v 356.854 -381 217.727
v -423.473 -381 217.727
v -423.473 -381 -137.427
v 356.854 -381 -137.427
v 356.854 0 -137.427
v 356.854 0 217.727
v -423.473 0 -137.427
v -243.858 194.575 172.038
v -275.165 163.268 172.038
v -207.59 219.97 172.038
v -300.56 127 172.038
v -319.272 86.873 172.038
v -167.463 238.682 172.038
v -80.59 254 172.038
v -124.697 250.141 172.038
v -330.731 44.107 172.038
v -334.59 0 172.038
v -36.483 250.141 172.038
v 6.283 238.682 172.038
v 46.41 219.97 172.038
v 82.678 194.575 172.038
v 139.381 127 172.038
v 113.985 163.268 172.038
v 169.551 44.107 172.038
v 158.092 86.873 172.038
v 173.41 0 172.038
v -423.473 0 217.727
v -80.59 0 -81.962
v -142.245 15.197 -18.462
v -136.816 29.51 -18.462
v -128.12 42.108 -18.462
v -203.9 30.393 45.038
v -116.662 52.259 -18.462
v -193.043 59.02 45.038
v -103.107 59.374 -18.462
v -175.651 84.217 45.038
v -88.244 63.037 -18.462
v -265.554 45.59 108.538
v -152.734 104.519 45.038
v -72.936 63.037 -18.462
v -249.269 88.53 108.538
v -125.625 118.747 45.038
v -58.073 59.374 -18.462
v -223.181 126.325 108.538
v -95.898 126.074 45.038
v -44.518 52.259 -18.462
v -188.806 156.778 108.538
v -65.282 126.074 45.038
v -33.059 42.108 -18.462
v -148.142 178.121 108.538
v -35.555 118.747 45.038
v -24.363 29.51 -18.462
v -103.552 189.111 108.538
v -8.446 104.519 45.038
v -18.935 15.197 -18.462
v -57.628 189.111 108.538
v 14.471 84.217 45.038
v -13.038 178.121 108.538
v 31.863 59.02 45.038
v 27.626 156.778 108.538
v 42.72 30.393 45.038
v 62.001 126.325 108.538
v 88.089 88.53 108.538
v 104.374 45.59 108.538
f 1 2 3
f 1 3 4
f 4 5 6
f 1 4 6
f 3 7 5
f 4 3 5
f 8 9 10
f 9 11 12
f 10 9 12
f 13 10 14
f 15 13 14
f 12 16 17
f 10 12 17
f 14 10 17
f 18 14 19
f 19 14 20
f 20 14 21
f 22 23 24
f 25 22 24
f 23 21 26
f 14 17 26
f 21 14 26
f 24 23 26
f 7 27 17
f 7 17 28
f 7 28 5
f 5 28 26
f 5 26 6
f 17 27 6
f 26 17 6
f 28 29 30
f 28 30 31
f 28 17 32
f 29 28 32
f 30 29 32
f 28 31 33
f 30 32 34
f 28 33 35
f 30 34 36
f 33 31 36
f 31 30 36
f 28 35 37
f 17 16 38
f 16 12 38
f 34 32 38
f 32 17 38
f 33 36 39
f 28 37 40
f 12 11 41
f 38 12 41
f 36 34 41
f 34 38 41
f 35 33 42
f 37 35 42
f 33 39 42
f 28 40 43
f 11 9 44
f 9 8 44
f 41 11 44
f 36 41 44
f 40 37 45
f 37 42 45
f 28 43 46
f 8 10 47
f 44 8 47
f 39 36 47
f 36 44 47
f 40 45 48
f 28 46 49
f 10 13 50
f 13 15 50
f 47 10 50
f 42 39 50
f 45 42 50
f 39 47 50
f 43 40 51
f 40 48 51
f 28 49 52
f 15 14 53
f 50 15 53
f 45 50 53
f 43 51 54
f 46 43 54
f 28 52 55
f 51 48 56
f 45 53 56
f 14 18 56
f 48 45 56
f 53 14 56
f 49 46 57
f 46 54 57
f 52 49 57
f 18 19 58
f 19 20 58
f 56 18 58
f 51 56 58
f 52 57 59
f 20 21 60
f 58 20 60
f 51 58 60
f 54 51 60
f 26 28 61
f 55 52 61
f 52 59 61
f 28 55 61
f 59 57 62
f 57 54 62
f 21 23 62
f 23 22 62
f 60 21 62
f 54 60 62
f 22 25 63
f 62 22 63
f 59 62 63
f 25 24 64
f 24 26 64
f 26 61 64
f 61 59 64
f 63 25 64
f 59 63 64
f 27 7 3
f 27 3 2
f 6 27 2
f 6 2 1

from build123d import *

# Parameters (mm, degrees)
F2_W     = 780.327082
F2_H     = 355.154276
F3_DEPTH = 381


with BuildPart() as f1:
    # F0 (on Front) → F1 (revolve)
    with BuildSketch(Plane.XZ):
        Polygon((173.410069, 172.037573), (-80.589931, 172.037573), (-80.589931, -81.962427), align=None)
    revolve(axis=Axis((-80.589931, 0, 45.037573), (0, 0, -1)))

    # F2 (on Front) → F3 (join)
    with BuildSketch(Plane.XZ):
        with Locations((-33.309847, 40.15027)):
            Rectangle(F2_W, F2_H)
    extrude(amount=F3_DEPTH)


solid = f1.part
